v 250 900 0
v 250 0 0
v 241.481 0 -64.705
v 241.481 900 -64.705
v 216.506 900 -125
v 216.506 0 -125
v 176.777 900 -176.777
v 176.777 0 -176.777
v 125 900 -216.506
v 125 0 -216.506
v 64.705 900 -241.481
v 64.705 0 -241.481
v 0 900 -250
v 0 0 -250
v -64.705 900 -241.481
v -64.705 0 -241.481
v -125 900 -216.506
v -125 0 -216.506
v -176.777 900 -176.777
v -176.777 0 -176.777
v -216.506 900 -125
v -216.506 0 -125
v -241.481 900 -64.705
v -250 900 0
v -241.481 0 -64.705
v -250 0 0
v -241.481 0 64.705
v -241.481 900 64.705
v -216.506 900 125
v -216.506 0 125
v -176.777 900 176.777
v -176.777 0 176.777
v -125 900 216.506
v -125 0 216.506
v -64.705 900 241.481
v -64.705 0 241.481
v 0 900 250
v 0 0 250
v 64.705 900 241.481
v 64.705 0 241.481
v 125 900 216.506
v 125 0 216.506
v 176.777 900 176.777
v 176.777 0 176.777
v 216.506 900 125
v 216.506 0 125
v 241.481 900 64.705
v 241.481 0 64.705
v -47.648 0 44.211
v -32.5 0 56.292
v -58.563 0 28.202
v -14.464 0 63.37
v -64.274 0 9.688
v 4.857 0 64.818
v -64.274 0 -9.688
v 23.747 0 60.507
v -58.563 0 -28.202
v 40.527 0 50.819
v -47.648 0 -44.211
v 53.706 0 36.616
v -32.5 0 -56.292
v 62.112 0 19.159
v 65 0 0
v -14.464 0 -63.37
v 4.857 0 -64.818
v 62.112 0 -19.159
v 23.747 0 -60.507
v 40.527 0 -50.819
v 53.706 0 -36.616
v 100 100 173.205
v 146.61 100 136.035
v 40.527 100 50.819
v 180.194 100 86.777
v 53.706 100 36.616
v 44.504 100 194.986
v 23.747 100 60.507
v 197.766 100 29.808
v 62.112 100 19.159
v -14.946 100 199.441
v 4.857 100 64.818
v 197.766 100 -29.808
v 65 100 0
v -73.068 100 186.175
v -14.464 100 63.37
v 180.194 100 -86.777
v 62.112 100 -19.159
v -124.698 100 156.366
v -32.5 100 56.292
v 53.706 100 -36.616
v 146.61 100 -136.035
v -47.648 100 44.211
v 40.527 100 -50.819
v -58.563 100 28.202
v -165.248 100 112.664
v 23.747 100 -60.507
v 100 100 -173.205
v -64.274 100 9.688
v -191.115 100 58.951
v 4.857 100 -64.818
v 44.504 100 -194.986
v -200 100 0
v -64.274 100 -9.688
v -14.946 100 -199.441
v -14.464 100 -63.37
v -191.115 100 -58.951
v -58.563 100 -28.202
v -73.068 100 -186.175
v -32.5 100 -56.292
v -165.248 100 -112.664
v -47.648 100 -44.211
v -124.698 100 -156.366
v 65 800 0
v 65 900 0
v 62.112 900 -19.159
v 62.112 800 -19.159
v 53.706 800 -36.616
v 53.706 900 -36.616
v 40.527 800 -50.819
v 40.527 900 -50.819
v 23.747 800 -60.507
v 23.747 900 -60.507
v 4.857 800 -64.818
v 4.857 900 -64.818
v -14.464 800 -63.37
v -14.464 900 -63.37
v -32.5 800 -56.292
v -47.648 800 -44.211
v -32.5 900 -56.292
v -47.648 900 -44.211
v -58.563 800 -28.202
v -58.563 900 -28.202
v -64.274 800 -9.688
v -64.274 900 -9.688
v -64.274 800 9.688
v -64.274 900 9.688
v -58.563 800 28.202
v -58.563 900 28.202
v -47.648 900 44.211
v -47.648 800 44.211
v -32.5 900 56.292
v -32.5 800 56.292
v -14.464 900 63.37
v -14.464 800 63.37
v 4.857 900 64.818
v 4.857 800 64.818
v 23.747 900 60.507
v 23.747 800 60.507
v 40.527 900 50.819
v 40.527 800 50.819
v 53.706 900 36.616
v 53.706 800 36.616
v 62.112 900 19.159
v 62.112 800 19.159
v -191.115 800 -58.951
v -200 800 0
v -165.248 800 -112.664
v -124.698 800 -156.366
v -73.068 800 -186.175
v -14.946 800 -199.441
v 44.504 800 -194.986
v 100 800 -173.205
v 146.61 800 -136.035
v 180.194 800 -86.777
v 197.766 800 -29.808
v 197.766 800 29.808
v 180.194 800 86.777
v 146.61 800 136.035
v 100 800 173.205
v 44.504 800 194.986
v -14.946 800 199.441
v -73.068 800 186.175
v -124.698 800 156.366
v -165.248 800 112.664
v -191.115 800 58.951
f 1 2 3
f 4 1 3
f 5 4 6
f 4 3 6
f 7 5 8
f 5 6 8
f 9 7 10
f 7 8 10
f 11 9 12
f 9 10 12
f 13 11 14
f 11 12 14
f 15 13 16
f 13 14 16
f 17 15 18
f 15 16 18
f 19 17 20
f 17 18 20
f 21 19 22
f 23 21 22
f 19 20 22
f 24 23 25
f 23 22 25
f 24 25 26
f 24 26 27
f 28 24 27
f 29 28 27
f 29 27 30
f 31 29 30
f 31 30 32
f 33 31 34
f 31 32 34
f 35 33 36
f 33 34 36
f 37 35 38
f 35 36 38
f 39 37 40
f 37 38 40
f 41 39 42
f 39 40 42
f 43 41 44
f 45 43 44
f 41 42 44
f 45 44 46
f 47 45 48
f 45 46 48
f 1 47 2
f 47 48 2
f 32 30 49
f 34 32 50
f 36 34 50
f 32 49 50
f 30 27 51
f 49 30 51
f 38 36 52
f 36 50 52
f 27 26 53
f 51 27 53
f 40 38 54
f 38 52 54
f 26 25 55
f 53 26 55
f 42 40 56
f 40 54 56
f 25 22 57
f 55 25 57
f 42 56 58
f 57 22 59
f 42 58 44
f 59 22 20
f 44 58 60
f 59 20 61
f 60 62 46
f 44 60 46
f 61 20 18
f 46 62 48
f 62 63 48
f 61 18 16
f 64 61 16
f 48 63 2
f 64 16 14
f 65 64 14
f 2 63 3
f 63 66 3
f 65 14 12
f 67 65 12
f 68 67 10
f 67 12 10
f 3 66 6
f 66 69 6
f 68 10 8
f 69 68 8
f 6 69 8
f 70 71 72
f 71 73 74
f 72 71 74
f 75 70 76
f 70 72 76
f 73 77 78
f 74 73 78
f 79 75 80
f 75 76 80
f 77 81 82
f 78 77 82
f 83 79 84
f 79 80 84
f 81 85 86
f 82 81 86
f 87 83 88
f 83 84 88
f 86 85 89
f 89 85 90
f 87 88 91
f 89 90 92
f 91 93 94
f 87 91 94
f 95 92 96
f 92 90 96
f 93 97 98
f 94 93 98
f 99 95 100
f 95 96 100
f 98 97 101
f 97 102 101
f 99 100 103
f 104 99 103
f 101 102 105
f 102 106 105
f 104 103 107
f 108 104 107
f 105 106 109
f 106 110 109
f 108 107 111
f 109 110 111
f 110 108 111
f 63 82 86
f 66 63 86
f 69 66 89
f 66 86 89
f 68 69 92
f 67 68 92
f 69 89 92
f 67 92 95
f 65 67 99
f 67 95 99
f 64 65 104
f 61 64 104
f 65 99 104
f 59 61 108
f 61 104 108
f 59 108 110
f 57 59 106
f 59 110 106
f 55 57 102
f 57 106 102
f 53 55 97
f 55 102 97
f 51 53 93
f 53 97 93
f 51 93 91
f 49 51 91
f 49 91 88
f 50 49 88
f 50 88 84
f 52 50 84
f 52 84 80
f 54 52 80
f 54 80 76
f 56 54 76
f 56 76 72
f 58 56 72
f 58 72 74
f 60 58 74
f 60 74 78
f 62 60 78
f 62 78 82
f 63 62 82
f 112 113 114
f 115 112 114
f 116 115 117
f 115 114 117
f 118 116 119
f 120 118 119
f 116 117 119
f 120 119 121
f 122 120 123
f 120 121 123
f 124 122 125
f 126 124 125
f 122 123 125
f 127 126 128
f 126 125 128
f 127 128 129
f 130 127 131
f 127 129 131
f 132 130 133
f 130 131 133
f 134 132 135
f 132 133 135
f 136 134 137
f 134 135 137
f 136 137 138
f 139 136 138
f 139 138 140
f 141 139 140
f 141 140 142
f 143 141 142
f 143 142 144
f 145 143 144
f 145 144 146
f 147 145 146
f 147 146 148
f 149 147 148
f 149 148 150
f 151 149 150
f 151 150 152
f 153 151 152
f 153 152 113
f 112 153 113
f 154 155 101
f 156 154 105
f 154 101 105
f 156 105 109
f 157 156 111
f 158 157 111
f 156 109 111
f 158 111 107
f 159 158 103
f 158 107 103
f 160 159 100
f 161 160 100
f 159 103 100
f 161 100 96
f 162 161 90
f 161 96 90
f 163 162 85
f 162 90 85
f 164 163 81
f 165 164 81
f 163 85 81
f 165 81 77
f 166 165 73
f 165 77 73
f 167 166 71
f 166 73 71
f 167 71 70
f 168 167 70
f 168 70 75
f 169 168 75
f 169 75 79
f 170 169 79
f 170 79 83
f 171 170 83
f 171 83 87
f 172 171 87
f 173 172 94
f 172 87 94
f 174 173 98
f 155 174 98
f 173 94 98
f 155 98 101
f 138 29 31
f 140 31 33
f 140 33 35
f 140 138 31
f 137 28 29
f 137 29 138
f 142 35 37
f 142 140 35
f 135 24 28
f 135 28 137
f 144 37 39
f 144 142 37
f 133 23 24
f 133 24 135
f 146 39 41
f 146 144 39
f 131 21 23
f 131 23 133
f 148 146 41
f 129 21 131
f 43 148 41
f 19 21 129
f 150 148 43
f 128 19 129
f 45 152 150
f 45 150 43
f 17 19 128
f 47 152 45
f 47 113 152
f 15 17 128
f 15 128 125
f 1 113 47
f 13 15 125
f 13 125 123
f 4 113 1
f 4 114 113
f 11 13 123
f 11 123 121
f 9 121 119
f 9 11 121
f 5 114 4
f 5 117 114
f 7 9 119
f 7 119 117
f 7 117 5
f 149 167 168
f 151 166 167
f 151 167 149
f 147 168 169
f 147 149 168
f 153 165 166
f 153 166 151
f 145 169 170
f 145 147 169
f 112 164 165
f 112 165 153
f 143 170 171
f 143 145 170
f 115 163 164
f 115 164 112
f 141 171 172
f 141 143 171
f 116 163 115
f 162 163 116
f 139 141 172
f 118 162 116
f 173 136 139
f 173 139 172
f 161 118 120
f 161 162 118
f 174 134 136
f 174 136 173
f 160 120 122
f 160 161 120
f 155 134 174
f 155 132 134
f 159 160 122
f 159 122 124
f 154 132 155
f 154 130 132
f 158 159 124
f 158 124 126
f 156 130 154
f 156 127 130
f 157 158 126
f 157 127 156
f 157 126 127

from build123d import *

# Parameters (mm, degrees)
SKETCH1_R           = 250
BOSS_EXTRUDE1_DEPTH = 900
CUT_EXTRUDE1_START  = -100
SKETCH5_R           = 200
CUT_EXTRUDE1_DEPTH  = 700
SKETCH6_R           = 65
CUT_EXTRUDE2_DEPTH  = 1356


with BuildPart() as part:
    # Sketch1 → Boss-Extrude1 (new body)
    with BuildSketch(Plane(origin=(0, 0, 0), x_dir=(1, 0, 0), z_dir=(0, 1, 0))):
        Circle(SKETCH1_R)
    extrude(amount=BOSS_EXTRUDE1_DEPTH)

    # Sketch5 → Cut-Extrude1 (cut)
    with BuildSketch(Plane(origin=(0, 0, 0), x_dir=(-1, 0, 0), z_dir=(0, -1, 0)).offset(CUT_EXTRUDE1_START)):
        Circle(SKETCH5_R)
    extrude(amount=-CUT_EXTRUDE1_DEPTH, mode=Mode.SUBTRACT)

    # Sketch6 → Cut-Extrude2 (cut)
    with BuildSketch(Plane(origin=(0, 900, 0), x_dir=(1, 0, 0), z_dir=(0, 1, 0))):
        Circle(SKETCH6_R)
    extrude(amount=-CUT_EXTRUDE2_DEPTH, mode=Mode.SUBTRACT)


solid = part.part
